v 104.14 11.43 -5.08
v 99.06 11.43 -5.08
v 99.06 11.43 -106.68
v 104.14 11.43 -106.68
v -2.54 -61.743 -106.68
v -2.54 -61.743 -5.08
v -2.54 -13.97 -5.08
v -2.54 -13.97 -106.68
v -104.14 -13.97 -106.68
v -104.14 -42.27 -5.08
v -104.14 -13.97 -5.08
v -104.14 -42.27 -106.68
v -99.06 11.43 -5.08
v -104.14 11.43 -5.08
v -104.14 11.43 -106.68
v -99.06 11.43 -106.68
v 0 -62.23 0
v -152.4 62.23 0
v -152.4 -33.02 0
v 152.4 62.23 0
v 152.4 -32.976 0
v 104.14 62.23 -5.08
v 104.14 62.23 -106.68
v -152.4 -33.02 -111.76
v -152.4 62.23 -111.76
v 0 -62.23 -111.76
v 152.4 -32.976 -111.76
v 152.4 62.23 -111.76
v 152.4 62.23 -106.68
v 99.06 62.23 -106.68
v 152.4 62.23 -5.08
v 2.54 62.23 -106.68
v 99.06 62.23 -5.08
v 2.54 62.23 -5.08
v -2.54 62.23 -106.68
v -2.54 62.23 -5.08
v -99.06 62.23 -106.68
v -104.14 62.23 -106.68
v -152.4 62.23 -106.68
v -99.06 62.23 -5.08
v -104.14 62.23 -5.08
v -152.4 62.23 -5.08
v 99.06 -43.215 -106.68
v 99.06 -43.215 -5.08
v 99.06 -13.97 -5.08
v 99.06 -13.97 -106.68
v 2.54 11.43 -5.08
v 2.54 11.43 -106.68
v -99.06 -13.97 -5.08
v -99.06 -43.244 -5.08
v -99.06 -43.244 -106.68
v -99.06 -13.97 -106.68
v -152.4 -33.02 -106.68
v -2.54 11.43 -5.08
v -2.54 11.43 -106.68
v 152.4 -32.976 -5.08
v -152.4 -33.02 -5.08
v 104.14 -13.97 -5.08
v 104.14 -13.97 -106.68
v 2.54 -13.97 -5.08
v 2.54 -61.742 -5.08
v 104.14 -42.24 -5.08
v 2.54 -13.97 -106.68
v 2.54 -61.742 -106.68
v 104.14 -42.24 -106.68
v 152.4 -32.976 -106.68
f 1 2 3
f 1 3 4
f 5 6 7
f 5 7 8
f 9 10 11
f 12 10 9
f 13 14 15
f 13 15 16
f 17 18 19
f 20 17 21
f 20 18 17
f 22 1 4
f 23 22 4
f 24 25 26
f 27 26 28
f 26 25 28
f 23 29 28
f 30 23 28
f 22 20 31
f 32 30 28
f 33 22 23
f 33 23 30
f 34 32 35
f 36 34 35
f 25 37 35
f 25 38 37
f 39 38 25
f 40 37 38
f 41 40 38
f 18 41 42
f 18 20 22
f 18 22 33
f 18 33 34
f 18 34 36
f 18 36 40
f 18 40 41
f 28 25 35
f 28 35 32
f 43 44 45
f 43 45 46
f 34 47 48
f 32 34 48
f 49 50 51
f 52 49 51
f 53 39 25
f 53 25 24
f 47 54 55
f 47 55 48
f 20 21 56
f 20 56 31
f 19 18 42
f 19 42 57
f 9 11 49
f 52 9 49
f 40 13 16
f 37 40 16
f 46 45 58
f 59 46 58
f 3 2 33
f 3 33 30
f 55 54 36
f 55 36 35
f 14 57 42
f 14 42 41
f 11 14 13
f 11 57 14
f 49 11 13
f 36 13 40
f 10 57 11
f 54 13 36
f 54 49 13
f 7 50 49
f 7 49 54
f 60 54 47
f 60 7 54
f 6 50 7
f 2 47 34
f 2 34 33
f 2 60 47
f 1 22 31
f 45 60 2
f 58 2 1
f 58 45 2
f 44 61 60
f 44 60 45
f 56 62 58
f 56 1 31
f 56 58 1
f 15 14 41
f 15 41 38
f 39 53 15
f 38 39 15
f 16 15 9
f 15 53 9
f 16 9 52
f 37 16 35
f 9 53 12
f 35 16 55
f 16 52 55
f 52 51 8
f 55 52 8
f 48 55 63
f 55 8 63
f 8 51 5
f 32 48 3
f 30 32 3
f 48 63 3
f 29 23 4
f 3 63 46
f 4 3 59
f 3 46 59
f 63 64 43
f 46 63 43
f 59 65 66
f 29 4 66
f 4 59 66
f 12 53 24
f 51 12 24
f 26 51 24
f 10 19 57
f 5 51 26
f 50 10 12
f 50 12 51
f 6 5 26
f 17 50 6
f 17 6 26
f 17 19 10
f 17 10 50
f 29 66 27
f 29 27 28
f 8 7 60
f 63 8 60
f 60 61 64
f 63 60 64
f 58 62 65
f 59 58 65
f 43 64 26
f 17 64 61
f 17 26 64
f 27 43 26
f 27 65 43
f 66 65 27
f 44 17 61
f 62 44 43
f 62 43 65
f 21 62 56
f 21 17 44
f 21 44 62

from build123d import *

# Parameters (mm, degrees)
BOSS_EXTRUDE1_DEPTH     = 111.76
SKETCH5_W               = 304.8
SKETCH5_H               = 25.4
CUT_EXTRUDE3_DEPTH      = 101.6
CUT_EXTRUDE4_DEPTH      = 227.288199427
CUT_EXTRUDE4_DEPTH_BACK = 227.288199427
SKETCH3_W               = 96.52
SKETCH3_H               = 101.6
SKETCH3_W_2             = 48.26


with BuildPart() as part:
    # Sketch1 → Boss-Extrude1 (new body)
    with BuildSketch(Plane.XY):
        Polygon((-152.4, 62.23), (-152.4, -33.02), (0, -62.23), (152.4, -32.976439839), (152.4, 62.23), align=None)
    extrude(amount=-BOSS_EXTRUDE1_DEPTH)

    # Sketch5 → Cut-Extrude3 (cut)
    with BuildSketch(Plane.XY.offset(-5.08)):
        with Locations((0, -1.27)):
            Rectangle(SKETCH5_W, SKETCH5_H)
    extrude(amount=-CUT_EXTRUDE3_DEPTH, mode=Mode.SUBTRACT)

    # Sketch3 → Cut-Extrude4 (cut, two sides: drawn at the far end of the back side and taken through both)
    with BuildSketch(Plane(origin=(0, 62.23, 0), x_dir=(1, 0, 0), z_dir=(0, 1, 0)).offset(-CUT_EXTRUDE4_DEPTH_BACK)):
        with Locations((-50.8, 55.88)):
            Rectangle(SKETCH3_W, SKETCH3_H)
        with Locations((50.8, 55.88)):
            Rectangle(SKETCH3_W, SKETCH3_H)
        with Locations((-128.27, 55.88)):
            Rectangle(SKETCH3_W_2, SKETCH3_H)
        with Locations((128.27, 55.88)):
            Rectangle(SKETCH3_W_2, SKETCH3_H)
    extrude(amount=CUT_EXTRUDE4_DEPTH + CUT_EXTRUDE4_DEPTH_BACK, mode=Mode.SUBTRACT)


solid = part.part
